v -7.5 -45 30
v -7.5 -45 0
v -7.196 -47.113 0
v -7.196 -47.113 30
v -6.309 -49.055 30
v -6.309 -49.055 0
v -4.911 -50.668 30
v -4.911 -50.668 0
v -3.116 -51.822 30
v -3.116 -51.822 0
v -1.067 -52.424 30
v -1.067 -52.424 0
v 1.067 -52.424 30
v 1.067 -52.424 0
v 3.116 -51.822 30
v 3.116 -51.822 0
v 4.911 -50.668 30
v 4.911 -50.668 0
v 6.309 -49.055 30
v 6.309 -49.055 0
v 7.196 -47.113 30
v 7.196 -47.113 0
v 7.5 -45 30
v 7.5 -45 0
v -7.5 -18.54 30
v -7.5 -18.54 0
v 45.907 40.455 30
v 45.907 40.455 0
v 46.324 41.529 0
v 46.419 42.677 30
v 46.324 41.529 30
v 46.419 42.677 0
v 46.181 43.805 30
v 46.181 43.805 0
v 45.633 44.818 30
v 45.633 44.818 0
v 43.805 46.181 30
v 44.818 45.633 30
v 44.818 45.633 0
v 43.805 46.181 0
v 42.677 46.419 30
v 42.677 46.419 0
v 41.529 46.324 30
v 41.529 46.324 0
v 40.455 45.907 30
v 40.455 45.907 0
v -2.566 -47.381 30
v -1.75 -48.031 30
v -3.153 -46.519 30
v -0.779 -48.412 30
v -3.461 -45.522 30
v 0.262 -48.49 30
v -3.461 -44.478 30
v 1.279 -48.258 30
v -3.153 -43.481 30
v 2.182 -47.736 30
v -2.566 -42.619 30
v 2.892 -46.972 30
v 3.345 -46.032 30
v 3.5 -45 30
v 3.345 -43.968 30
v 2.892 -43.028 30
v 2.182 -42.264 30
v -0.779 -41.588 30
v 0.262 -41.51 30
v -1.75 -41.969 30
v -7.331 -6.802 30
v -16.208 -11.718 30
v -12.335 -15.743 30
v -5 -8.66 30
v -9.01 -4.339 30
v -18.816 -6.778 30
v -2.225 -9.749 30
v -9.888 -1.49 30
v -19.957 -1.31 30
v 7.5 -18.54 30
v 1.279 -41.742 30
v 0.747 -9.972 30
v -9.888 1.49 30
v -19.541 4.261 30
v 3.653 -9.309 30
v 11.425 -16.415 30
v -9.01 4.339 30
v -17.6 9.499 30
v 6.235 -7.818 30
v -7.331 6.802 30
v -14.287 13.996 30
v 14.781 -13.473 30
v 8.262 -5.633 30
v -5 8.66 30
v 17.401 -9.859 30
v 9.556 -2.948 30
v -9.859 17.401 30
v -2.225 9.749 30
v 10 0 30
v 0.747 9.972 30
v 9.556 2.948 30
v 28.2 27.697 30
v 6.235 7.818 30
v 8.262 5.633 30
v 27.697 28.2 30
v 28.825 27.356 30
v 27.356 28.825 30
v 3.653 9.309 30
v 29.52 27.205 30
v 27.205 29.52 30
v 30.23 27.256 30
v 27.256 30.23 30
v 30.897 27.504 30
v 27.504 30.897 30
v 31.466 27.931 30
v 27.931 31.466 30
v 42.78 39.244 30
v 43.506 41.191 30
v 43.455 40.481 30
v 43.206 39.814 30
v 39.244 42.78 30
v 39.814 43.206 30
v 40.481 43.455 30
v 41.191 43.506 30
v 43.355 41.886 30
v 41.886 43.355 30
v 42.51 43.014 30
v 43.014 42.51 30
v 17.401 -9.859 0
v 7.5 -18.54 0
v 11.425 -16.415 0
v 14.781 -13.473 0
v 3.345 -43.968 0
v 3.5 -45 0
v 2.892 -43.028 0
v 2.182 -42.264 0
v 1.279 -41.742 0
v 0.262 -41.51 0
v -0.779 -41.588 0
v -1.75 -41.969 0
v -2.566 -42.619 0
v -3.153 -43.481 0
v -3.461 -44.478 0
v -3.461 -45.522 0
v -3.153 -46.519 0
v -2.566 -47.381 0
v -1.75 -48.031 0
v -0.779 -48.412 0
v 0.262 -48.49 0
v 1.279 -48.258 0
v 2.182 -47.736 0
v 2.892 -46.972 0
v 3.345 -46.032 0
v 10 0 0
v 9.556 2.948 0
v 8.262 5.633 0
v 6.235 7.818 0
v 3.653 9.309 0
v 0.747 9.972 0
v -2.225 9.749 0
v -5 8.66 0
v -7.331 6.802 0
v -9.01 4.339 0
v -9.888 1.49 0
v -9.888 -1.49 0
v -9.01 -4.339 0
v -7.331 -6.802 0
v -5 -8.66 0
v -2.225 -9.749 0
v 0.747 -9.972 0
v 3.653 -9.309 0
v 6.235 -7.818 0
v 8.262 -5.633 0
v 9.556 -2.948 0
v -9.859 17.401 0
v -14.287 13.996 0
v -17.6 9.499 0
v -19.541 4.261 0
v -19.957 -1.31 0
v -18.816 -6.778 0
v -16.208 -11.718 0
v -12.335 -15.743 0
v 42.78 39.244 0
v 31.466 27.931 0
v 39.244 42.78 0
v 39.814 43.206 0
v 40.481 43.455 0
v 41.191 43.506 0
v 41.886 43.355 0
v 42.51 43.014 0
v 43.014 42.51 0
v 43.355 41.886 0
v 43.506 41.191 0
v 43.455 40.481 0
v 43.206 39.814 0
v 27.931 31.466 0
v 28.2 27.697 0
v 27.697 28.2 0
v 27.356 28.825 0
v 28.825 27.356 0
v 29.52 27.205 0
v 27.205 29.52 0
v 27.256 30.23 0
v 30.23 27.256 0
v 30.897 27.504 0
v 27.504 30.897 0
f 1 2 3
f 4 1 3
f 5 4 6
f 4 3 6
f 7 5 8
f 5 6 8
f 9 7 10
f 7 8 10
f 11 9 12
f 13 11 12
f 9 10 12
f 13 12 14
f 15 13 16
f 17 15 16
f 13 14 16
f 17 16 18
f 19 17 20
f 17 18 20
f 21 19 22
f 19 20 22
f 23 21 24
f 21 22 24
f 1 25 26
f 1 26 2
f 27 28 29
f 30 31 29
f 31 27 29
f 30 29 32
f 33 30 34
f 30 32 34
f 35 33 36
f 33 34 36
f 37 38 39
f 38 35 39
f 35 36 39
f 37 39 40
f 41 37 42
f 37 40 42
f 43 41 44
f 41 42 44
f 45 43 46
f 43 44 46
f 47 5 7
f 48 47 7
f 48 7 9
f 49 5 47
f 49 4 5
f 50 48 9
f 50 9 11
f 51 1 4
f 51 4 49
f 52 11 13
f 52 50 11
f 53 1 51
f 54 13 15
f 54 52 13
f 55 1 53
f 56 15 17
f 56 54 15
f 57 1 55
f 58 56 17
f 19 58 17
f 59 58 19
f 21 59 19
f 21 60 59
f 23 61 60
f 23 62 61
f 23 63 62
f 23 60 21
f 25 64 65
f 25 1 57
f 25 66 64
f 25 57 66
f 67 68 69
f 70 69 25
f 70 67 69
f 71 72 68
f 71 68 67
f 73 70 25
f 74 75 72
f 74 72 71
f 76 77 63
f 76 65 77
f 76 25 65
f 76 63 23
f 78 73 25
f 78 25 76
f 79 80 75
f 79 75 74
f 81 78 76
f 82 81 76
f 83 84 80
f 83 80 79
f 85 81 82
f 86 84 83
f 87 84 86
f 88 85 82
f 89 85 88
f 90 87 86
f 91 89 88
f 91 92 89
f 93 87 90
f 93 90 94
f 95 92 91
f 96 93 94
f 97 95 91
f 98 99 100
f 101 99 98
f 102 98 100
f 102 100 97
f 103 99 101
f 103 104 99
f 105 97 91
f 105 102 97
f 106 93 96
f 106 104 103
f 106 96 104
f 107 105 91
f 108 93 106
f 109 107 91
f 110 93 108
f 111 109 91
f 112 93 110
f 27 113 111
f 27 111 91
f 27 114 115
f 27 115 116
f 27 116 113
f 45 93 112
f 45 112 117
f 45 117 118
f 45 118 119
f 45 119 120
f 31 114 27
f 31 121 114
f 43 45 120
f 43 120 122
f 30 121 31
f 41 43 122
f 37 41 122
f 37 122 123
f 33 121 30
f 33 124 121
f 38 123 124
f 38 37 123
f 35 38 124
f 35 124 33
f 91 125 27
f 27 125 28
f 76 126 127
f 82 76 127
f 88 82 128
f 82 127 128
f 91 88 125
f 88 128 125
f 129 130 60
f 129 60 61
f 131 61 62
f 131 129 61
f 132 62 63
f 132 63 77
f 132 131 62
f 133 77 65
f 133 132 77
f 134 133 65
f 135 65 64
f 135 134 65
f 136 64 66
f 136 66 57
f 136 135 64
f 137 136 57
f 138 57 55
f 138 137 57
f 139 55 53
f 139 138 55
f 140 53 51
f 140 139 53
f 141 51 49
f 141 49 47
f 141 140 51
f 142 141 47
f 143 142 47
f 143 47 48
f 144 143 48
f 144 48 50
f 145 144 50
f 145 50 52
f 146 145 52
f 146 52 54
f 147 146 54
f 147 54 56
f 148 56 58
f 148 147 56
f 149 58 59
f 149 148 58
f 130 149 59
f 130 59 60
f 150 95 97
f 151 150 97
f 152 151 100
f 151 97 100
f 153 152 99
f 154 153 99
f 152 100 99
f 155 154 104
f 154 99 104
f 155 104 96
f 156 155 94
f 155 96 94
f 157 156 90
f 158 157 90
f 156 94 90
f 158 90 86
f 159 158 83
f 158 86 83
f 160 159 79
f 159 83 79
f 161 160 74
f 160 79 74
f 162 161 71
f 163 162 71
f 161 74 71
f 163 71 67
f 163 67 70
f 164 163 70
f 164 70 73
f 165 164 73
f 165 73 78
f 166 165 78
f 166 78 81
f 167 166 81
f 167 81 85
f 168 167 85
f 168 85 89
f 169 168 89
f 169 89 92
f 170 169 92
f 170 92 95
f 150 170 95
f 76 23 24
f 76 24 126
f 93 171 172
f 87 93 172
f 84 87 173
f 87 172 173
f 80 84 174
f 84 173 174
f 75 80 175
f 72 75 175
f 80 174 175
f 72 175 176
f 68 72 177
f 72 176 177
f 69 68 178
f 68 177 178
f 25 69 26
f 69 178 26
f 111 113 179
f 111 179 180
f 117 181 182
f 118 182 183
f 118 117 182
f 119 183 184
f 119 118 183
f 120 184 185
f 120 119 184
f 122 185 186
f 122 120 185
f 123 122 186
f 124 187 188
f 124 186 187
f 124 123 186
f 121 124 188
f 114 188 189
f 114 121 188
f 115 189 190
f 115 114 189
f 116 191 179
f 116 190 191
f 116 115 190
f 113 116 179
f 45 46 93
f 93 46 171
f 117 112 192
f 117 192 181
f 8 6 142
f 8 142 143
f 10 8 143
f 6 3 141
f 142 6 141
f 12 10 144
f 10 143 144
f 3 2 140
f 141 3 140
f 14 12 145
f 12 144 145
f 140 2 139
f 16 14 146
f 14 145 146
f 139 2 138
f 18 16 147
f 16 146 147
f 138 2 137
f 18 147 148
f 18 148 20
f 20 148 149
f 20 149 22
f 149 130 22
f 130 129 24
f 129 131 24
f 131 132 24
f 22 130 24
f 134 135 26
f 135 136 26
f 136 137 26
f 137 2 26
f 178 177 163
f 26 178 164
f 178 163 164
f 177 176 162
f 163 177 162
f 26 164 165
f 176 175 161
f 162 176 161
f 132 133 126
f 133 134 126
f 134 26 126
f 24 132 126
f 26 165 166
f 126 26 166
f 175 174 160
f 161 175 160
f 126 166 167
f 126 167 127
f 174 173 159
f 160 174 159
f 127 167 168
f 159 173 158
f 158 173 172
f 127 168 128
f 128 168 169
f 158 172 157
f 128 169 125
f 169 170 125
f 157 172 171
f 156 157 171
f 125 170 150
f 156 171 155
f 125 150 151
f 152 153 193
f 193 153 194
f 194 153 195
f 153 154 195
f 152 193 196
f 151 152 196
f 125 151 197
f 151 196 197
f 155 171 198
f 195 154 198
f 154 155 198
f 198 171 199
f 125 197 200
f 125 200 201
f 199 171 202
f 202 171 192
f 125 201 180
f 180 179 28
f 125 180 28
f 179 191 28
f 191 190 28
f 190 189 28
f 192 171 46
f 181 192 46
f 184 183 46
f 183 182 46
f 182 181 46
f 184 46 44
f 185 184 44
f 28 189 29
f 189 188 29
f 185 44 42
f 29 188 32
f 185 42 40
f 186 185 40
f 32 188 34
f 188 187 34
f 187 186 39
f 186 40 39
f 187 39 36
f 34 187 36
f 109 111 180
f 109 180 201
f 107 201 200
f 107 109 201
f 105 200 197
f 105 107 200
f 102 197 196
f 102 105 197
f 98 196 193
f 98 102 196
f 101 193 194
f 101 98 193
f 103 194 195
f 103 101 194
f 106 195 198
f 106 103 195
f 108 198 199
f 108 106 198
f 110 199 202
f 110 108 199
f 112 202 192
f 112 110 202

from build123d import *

# Parameters (mm, degrees)
SKETCH_1_R          = 3.5
SKETCH_1_R_2        = 4
EXTRUDE_1_DEPTH     = 30
SKETCH_3_R          = 10
CUT_EXTRUDE_1_DEPTH = 77.234252505


with BuildPart() as part:
    # Эскиз1 → Бобышка-Вытянуть1 (new body)
    # profile 1 of 7: a face of its own
    with BuildSketch(Plane.XY):
        with BuildLine():
            Line((40.454647664, 45.906660544), (-9.858796034, 17.401268367))
            ThreePointArc((-9.858796034, 17.401268367), (10.070354495, 17.279697924), (20, 0))
            ThreePointArc((20, 0), (19.339407531, -5.097775626), (17.401268367, -9.858796034))
            Line((17.401268367, -9.858796034), (45.906660544, 40.454647664))
            ThreePointArc((45.906660544, 40.454647664), (39.597979746, 39.597979746), (40.454647664, 45.906660544))
        make_face()
    # profile 2 of 7: a face of its own
    with BuildSketch(Plane.XY):
        with BuildLine():
            ThreePointArc((20, 0), (10.070354495, 17.279697924), (-9.858796034, 17.401268367))
            ThreePointArc((-9.858796034, 17.401268367), (-19.957067928, -1.309747955), (-7.5, -18.540496218))
            Line((-7.5, -18.540496218), (-7.5, 0))
            ThreePointArc((-7.5, 0), (0, 7.5), (7.5, 0))
            Line((7.5, 0), (7.5, -18.540496218))
            ThreePointArc((7.5, -18.540496218), (13.185646404, -15.037909726), (17.401268367, -9.858796034))
            ThreePointArc((17.401268367, -9.858796034), (19.339407531, -5.097775626), (20, 0))
        make_face()
    # profile 3 of 7: a face of its own
    with BuildSketch(Plane.XY):
        with BuildLine():
            Line((-7.5, 0), (-7.5, -18.540496218))
            ThreePointArc((-7.5, -18.540496218), (0, -20), (7.5, -18.540496218))
            Line((7.5, -18.540496218), (7.5, 0))
            ThreePointArc((7.5, 0), (0, 7.5), (-7.5, 0))
        make_face()
    # profile 4 of 7: a face of its own
    with BuildSketch(Plane.XY):
        with BuildLine():
            ThreePointArc((20, 0), (10.070354495, 17.279697924), (-9.858796034, 17.401268367))
            ThreePointArc((-9.858796034, 17.401268367), (-19.957067928, -1.309747955), (-7.5, -18.540496218))
            Line((-7.5, -18.540496218), (-7.5, 0))
            ThreePointArc((-7.5, 0), (0, 7.5), (7.5, 0))
            Line((7.5, 0), (7.5, -18.540496218))
            ThreePointArc((7.5, -18.540496218), (13.185646404, -15.037909726), (17.401268367, -9.858796034))
            ThreePointArc((17.401268367, -9.858796034), (19.339407531, -5.097775626), (20, 0))
        make_face()
    # profile 5 of 7: a face of its own
    with BuildSketch(Plane.XY):
        with BuildLine():
            Line((-7.5, 0), (-7.5, -18.540496218))
            ThreePointArc((-7.5, -18.540496218), (0, -20), (7.5, -18.540496218))
            Line((7.5, -18.540496218), (7.5, 0))
            ThreePointArc((7.5, 0), (0, 7.5), (-7.5, 0))
        make_face()
    # profile 6 of 7: a face of its own
    with BuildSketch(Plane.XY):
        with BuildLine():
            ThreePointArc((7.5, -18.540496218), (0, -20), (-7.5, -18.540496218))
            Line((-7.5, -18.540496218), (-7.5, -45))
            ThreePointArc((-7.5, -45), (0, -52.5), (7.5, -45))
            Line((7.5, -45), (7.5, -18.540496218))
        make_face()
        with Locations((0, -45)):
            Circle(SKETCH_1_R, mode=Mode.SUBTRACT)
    # profile 7 of 7: a face of its own
    with BuildSketch(Plane.XY):
        with Locations((42.426406871, 42.426406871)):
            Circle(SKETCH_1_R_2)
    extrude(amount=EXTRUDE_1_DEPTH)

    # Эскиз3 → Вырез-Вытянуть1 (cut, through all)
    with BuildSketch(Plane.XY.offset(30)):
        Circle(SKETCH_3_R)
        with BuildLine():
            Line((27.930717857, 31.466251763), (39.244426356, 42.779960262))
            ThreePointArc((39.244426356, 42.779960262), (42.779960262, 42.779960262), (42.779960262, 39.244426356))
            Line((42.779960262, 39.244426356), (31.466251763, 27.930717857))
            ThreePointArc((31.466251763, 27.930717857), (27.930717857, 27.930717857), (27.930717857, 31.466251763))
        make_face()
    extrude(amount=-CUT_EXTRUDE_1_DEPTH, mode=Mode.SUBTRACT)


solid = part.part
